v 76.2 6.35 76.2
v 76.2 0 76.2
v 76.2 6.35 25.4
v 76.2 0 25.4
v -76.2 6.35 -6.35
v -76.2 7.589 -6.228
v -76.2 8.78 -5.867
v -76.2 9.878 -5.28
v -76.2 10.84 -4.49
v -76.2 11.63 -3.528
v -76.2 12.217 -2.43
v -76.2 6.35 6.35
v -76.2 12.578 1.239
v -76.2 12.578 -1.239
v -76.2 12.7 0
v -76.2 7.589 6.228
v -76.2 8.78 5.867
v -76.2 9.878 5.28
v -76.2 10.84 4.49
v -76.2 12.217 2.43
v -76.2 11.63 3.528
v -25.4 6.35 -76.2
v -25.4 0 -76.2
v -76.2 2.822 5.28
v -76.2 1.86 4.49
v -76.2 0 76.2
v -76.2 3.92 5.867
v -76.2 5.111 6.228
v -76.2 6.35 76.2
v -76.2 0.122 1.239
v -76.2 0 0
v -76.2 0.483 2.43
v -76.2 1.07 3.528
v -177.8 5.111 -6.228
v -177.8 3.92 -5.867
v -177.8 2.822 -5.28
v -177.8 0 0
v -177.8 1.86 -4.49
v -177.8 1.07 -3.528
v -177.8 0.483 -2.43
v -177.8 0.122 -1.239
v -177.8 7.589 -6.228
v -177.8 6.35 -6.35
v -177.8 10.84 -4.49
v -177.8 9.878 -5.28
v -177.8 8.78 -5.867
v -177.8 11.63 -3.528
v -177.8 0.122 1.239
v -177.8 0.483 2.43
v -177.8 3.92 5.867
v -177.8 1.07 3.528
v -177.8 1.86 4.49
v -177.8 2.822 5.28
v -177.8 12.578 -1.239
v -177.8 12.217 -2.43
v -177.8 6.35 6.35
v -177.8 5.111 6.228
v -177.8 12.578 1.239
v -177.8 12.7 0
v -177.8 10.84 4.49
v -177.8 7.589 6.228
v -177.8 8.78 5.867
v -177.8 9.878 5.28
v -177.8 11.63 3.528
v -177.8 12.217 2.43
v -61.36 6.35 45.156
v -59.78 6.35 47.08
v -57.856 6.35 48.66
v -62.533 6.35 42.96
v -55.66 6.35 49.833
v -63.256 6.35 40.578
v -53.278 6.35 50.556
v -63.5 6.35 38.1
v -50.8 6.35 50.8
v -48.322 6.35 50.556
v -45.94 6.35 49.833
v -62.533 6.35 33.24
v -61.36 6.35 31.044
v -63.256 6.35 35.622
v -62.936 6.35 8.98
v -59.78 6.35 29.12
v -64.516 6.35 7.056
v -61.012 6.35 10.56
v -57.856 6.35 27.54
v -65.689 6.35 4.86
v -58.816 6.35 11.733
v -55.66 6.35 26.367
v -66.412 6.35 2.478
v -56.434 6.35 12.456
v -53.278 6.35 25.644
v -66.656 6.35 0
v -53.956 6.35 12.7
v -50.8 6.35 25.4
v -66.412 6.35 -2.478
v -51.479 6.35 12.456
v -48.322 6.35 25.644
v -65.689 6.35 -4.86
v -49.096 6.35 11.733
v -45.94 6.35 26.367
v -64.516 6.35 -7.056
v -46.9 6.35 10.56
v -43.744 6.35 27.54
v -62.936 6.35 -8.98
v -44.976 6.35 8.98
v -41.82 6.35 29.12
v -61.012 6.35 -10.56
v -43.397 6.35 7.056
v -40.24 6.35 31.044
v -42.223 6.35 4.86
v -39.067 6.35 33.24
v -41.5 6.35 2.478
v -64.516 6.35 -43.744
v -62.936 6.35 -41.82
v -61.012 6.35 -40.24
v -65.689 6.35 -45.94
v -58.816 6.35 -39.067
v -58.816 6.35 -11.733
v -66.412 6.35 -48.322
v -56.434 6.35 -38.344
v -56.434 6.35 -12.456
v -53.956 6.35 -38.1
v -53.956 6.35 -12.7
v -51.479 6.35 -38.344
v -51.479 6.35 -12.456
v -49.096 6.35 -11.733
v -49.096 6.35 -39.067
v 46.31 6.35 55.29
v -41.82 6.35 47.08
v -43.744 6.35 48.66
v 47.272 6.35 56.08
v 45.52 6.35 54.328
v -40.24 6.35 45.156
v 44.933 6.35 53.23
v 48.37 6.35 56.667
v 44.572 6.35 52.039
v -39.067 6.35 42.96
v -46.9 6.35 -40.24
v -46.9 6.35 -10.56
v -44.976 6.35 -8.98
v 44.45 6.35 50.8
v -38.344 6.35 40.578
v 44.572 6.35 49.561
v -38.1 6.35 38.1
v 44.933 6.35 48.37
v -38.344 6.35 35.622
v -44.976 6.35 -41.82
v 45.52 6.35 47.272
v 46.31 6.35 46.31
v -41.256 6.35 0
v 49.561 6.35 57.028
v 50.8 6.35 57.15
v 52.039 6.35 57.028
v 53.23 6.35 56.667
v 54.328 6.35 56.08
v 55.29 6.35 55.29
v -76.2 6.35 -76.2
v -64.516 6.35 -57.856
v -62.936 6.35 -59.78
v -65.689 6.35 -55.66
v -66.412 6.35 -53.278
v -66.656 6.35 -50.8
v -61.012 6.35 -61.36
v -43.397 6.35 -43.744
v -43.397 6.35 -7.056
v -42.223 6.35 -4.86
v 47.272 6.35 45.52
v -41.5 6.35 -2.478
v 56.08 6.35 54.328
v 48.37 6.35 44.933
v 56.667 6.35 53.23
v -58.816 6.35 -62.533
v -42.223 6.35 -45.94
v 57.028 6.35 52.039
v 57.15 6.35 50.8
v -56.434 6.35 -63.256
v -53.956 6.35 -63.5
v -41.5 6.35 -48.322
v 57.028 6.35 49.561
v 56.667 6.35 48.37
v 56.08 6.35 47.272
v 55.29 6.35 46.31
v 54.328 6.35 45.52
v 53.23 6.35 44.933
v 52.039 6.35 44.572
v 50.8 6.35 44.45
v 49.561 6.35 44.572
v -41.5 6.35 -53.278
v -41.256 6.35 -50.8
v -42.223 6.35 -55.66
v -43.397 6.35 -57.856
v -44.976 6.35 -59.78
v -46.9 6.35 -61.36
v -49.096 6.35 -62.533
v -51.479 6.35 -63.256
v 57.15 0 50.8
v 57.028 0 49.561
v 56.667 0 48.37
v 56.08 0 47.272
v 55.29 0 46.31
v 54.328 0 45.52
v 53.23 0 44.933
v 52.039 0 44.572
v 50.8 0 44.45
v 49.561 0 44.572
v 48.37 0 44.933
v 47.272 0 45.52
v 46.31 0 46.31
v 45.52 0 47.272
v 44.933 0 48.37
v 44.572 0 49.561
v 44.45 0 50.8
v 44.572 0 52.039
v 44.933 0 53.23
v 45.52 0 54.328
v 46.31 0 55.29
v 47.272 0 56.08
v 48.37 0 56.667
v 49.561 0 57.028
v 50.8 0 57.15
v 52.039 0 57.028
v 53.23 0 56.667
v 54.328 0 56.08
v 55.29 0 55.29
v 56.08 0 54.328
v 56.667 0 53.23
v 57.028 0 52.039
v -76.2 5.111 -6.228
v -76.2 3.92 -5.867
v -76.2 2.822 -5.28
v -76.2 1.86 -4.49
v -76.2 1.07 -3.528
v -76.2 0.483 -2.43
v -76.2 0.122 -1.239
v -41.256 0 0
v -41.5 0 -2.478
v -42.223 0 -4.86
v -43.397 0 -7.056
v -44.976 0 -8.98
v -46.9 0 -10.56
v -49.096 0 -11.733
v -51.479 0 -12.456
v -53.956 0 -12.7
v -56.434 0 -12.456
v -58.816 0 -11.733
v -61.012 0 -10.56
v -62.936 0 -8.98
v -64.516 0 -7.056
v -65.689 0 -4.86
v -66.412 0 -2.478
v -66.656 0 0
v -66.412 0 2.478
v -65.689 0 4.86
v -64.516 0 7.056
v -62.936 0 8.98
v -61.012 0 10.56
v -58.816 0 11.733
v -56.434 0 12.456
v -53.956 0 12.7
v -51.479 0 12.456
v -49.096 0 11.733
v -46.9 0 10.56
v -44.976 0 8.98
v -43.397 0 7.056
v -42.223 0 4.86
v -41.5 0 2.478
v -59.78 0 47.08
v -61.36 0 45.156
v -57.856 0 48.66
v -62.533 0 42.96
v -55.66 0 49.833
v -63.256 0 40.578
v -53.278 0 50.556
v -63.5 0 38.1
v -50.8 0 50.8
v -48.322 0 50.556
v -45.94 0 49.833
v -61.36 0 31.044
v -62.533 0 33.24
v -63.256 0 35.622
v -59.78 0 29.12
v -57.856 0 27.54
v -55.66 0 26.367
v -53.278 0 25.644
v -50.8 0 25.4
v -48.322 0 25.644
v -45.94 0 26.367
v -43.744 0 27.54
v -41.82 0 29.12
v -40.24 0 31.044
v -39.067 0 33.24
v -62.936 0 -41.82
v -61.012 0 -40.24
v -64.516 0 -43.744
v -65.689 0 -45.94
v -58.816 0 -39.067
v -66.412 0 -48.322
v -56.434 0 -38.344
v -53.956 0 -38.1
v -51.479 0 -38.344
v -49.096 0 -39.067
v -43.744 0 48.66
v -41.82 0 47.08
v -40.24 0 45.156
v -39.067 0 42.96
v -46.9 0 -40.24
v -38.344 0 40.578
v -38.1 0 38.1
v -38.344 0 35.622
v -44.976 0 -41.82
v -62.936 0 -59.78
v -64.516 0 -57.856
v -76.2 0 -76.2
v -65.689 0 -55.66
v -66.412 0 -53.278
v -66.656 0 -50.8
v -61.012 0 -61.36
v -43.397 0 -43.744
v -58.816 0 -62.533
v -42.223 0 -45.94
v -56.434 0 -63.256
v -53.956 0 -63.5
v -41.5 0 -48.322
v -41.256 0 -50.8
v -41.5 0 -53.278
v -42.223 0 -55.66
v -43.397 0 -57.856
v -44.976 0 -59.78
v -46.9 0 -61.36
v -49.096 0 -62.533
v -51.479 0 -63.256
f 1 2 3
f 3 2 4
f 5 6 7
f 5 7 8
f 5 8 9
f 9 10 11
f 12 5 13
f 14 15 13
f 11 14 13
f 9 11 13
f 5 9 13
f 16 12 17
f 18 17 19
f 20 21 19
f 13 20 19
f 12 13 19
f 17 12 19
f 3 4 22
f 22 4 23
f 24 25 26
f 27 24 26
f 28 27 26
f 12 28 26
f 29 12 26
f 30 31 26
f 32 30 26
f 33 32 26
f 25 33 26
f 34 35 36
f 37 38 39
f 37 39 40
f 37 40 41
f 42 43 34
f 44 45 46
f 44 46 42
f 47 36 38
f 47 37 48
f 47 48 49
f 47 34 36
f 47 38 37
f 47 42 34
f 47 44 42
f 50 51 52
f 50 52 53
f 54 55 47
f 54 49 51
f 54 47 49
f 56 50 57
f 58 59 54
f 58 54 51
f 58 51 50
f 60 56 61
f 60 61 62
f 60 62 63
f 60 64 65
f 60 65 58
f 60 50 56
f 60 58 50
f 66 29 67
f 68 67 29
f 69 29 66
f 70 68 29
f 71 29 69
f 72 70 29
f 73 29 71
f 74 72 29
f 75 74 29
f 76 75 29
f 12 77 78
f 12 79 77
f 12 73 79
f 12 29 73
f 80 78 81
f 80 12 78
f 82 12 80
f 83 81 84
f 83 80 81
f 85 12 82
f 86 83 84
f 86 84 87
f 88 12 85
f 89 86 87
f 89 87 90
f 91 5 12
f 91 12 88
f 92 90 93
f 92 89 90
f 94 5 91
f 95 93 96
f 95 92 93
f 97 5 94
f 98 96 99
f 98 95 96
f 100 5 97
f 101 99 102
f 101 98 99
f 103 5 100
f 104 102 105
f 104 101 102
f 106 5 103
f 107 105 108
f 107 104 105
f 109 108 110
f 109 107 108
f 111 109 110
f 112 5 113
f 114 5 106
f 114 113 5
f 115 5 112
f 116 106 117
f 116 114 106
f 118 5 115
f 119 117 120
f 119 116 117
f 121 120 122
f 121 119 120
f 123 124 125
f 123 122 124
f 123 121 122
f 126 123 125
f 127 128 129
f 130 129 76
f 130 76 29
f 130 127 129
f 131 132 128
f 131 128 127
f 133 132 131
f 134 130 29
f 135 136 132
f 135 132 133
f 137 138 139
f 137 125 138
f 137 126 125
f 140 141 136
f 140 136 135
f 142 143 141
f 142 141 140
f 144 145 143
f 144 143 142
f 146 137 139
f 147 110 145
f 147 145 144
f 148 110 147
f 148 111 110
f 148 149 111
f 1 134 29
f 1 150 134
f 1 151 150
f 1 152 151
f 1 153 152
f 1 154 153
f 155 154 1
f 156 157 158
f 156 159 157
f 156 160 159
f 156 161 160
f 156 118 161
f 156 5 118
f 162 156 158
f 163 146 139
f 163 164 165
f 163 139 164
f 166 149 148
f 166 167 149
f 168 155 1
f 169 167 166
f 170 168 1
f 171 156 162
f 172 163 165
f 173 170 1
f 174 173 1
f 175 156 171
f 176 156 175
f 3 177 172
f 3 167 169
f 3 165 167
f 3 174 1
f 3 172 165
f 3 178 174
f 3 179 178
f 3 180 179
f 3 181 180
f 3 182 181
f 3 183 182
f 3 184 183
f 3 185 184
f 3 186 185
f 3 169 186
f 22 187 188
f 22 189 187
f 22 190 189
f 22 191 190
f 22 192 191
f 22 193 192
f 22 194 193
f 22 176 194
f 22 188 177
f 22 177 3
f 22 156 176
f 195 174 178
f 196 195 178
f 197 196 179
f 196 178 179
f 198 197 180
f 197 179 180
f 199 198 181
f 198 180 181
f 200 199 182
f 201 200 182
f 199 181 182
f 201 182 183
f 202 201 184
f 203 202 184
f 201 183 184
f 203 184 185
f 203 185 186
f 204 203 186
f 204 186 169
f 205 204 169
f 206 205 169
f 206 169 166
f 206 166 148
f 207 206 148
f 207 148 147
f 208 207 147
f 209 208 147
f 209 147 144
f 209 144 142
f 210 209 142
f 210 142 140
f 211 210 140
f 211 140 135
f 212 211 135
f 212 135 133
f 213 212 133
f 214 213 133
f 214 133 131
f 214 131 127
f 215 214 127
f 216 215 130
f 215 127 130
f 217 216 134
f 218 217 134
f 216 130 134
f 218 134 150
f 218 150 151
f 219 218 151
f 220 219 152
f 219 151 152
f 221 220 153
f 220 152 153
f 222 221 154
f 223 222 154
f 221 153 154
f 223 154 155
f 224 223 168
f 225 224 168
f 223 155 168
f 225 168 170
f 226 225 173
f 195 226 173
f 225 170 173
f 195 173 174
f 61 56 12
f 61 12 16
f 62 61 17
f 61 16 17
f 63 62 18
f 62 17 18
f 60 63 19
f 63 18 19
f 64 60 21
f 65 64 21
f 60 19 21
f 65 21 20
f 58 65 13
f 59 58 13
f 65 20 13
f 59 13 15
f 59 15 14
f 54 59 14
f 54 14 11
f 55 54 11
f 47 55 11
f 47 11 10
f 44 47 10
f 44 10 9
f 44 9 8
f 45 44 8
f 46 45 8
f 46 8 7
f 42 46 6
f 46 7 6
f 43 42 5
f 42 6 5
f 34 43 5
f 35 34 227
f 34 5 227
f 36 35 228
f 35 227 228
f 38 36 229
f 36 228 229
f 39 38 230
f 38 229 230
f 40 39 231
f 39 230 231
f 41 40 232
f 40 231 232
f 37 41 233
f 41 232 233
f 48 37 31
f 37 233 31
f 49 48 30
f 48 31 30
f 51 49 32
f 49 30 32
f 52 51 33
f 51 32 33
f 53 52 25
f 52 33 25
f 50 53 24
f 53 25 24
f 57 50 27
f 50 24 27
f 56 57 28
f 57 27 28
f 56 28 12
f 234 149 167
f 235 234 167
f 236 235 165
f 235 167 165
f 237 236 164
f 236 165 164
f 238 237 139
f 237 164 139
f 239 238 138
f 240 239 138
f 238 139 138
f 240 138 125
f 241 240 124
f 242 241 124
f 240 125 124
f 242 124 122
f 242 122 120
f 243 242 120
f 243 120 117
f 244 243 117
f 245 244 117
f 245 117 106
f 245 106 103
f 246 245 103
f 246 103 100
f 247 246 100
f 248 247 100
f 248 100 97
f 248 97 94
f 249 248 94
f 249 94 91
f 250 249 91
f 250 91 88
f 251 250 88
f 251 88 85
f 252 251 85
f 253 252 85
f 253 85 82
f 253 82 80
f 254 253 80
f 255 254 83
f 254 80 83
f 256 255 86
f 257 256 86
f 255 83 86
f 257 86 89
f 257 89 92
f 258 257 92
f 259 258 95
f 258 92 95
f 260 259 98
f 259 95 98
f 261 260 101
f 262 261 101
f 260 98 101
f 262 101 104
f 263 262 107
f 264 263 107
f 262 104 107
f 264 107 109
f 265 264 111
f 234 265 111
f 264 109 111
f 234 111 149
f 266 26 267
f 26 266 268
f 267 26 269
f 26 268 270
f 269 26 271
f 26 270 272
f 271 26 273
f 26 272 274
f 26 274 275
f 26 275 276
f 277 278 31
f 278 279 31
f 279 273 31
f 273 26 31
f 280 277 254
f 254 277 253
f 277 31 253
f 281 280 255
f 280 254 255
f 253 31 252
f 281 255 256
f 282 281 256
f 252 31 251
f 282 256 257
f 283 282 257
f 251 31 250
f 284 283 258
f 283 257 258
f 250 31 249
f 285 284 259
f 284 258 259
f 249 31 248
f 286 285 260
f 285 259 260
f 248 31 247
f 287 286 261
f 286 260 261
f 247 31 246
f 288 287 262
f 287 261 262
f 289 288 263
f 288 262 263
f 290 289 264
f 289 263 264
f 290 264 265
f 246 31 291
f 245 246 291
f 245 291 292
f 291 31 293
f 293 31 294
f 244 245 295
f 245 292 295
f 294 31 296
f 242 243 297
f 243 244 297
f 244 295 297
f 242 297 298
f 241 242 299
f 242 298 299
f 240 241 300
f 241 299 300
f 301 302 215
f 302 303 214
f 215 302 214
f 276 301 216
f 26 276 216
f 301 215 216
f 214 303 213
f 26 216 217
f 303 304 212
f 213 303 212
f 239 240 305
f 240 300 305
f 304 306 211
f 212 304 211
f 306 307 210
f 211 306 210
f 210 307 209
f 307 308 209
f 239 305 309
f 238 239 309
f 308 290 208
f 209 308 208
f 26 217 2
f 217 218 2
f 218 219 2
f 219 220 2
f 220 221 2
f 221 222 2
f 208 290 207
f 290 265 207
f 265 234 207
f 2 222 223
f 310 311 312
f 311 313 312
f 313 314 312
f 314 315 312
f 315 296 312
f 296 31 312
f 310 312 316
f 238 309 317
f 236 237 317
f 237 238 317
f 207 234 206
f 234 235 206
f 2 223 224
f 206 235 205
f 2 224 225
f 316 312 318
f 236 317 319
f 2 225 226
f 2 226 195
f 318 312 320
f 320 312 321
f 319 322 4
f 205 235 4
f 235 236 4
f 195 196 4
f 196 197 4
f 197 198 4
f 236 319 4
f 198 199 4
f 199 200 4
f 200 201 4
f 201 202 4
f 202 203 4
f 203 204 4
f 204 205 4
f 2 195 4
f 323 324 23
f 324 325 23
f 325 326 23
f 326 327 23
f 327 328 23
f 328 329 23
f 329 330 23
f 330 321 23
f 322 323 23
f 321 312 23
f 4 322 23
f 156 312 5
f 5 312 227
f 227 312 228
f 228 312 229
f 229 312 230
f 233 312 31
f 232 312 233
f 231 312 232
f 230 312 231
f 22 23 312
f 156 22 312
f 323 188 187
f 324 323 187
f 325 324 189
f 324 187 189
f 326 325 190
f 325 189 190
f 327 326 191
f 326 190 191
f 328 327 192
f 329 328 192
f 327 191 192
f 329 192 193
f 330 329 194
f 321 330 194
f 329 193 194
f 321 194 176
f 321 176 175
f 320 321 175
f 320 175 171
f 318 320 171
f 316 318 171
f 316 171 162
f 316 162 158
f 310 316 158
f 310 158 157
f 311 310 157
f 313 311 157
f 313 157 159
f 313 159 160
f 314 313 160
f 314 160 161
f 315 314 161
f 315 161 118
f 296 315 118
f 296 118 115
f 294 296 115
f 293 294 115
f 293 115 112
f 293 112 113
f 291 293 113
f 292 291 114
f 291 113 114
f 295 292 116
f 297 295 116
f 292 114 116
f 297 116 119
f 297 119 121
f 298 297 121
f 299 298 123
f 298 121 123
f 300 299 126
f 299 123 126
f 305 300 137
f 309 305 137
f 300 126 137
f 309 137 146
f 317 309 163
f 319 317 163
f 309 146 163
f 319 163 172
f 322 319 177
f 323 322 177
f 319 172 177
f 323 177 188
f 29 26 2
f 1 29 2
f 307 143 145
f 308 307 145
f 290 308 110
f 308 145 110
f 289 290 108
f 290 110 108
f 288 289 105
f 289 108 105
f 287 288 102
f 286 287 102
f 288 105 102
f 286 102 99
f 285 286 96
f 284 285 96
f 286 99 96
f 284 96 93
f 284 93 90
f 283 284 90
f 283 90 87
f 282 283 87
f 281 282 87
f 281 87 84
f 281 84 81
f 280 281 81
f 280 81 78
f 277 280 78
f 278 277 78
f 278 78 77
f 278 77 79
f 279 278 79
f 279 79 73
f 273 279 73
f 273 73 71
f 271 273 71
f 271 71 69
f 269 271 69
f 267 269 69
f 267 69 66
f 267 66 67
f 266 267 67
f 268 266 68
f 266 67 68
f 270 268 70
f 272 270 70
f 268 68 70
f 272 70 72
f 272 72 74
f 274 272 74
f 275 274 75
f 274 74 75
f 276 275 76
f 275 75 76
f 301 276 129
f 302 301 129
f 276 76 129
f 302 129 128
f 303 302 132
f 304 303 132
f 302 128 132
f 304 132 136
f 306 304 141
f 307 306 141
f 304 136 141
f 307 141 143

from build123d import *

# Parameters (mm, degrees)
BOSS_EXTRUDE1_DEPTH     = 6.35
SKETCH2_R               = 6.35
BOSS_EXTRUDE2_DEPTH     = 101.6
SKETCH3_R               = 12.7
SKETCH3_R_2             = 6.35
CUT_EXTRUDE1_DEPTH      = 101.6
SKETCH4_R               = 12.7
CUT_EXTRUDE2_DEPTH      = 7.35
SKETCH5_R               = 12.7
CUT_EXTRUDE3_DEPTH      = 7.35
CUT_EXTRUDE3_DEPTH_BACK = 7.35


with BuildPart() as part:
    # Sketch1 → Boss-Extrude1 (new body)
    with BuildSketch(Plane(origin=(0, 0, 0), x_dir=(1, 0, 0), z_dir=(0, 1, 0))):
        Polygon((-76.2, 76.2), (-76.2, -76.2), (76.2, -76.2), (76.2, -25.4), (-25.4, 76.2), align=None)
    extrude(amount=BOSS_EXTRUDE1_DEPTH)

    # Sketch2 → Boss-Extrude2 (add)
    with BuildSketch(Plane.ZY.offset(76.2)):
        with Locations((0, 6.35)):
            Circle(SKETCH2_R)
    extrude(amount=BOSS_EXTRUDE2_DEPTH)

    # Sketch3 → Cut-Extrude1 (cut)
    with BuildSketch(Plane(origin=(0, 6.35, 0), x_dir=(1, 0, 0), z_dir=(0, 1, 0))):
        with Locations((-50.8, -38.1)):
            Circle(SKETCH3_R)
        with Locations((50.8, -50.8)):
            Circle(SKETCH3_R_2)
    extrude(amount=-CUT_EXTRUDE1_DEPTH, mode=Mode.SUBTRACT)

    # Sketch4 → Cut-Extrude2 (cut, through all)
    with BuildSketch(Plane(origin=(0, 6.35, 0), x_dir=(1, 0, 0), z_dir=(0, 1, 0))):
        with Locations((-53.956209782, 0)):
            Circle(SKETCH4_R)
    extrude(amount=-CUT_EXTRUDE2_DEPTH, mode=Mode.SUBTRACT)

    # Sketch5 → Cut-Extrude3 (cut, two sides)
    with BuildSketch(Plane(origin=(0, 6.35, 0), x_dir=(1, 0, 0), z_dir=(0, 1, 0))) as cut_extrude3_sk:
        with Locations((-53.956209782, 50.8)):
            Circle(SKETCH5_R)
    extrude(amount=CUT_EXTRUDE3_DEPTH, mode=Mode.SUBTRACT)
    extrude(cut_extrude3_sk.sketch, amount=-CUT_EXTRUDE3_DEPTH_BACK, mode=Mode.SUBTRACT)


solid = part.part
